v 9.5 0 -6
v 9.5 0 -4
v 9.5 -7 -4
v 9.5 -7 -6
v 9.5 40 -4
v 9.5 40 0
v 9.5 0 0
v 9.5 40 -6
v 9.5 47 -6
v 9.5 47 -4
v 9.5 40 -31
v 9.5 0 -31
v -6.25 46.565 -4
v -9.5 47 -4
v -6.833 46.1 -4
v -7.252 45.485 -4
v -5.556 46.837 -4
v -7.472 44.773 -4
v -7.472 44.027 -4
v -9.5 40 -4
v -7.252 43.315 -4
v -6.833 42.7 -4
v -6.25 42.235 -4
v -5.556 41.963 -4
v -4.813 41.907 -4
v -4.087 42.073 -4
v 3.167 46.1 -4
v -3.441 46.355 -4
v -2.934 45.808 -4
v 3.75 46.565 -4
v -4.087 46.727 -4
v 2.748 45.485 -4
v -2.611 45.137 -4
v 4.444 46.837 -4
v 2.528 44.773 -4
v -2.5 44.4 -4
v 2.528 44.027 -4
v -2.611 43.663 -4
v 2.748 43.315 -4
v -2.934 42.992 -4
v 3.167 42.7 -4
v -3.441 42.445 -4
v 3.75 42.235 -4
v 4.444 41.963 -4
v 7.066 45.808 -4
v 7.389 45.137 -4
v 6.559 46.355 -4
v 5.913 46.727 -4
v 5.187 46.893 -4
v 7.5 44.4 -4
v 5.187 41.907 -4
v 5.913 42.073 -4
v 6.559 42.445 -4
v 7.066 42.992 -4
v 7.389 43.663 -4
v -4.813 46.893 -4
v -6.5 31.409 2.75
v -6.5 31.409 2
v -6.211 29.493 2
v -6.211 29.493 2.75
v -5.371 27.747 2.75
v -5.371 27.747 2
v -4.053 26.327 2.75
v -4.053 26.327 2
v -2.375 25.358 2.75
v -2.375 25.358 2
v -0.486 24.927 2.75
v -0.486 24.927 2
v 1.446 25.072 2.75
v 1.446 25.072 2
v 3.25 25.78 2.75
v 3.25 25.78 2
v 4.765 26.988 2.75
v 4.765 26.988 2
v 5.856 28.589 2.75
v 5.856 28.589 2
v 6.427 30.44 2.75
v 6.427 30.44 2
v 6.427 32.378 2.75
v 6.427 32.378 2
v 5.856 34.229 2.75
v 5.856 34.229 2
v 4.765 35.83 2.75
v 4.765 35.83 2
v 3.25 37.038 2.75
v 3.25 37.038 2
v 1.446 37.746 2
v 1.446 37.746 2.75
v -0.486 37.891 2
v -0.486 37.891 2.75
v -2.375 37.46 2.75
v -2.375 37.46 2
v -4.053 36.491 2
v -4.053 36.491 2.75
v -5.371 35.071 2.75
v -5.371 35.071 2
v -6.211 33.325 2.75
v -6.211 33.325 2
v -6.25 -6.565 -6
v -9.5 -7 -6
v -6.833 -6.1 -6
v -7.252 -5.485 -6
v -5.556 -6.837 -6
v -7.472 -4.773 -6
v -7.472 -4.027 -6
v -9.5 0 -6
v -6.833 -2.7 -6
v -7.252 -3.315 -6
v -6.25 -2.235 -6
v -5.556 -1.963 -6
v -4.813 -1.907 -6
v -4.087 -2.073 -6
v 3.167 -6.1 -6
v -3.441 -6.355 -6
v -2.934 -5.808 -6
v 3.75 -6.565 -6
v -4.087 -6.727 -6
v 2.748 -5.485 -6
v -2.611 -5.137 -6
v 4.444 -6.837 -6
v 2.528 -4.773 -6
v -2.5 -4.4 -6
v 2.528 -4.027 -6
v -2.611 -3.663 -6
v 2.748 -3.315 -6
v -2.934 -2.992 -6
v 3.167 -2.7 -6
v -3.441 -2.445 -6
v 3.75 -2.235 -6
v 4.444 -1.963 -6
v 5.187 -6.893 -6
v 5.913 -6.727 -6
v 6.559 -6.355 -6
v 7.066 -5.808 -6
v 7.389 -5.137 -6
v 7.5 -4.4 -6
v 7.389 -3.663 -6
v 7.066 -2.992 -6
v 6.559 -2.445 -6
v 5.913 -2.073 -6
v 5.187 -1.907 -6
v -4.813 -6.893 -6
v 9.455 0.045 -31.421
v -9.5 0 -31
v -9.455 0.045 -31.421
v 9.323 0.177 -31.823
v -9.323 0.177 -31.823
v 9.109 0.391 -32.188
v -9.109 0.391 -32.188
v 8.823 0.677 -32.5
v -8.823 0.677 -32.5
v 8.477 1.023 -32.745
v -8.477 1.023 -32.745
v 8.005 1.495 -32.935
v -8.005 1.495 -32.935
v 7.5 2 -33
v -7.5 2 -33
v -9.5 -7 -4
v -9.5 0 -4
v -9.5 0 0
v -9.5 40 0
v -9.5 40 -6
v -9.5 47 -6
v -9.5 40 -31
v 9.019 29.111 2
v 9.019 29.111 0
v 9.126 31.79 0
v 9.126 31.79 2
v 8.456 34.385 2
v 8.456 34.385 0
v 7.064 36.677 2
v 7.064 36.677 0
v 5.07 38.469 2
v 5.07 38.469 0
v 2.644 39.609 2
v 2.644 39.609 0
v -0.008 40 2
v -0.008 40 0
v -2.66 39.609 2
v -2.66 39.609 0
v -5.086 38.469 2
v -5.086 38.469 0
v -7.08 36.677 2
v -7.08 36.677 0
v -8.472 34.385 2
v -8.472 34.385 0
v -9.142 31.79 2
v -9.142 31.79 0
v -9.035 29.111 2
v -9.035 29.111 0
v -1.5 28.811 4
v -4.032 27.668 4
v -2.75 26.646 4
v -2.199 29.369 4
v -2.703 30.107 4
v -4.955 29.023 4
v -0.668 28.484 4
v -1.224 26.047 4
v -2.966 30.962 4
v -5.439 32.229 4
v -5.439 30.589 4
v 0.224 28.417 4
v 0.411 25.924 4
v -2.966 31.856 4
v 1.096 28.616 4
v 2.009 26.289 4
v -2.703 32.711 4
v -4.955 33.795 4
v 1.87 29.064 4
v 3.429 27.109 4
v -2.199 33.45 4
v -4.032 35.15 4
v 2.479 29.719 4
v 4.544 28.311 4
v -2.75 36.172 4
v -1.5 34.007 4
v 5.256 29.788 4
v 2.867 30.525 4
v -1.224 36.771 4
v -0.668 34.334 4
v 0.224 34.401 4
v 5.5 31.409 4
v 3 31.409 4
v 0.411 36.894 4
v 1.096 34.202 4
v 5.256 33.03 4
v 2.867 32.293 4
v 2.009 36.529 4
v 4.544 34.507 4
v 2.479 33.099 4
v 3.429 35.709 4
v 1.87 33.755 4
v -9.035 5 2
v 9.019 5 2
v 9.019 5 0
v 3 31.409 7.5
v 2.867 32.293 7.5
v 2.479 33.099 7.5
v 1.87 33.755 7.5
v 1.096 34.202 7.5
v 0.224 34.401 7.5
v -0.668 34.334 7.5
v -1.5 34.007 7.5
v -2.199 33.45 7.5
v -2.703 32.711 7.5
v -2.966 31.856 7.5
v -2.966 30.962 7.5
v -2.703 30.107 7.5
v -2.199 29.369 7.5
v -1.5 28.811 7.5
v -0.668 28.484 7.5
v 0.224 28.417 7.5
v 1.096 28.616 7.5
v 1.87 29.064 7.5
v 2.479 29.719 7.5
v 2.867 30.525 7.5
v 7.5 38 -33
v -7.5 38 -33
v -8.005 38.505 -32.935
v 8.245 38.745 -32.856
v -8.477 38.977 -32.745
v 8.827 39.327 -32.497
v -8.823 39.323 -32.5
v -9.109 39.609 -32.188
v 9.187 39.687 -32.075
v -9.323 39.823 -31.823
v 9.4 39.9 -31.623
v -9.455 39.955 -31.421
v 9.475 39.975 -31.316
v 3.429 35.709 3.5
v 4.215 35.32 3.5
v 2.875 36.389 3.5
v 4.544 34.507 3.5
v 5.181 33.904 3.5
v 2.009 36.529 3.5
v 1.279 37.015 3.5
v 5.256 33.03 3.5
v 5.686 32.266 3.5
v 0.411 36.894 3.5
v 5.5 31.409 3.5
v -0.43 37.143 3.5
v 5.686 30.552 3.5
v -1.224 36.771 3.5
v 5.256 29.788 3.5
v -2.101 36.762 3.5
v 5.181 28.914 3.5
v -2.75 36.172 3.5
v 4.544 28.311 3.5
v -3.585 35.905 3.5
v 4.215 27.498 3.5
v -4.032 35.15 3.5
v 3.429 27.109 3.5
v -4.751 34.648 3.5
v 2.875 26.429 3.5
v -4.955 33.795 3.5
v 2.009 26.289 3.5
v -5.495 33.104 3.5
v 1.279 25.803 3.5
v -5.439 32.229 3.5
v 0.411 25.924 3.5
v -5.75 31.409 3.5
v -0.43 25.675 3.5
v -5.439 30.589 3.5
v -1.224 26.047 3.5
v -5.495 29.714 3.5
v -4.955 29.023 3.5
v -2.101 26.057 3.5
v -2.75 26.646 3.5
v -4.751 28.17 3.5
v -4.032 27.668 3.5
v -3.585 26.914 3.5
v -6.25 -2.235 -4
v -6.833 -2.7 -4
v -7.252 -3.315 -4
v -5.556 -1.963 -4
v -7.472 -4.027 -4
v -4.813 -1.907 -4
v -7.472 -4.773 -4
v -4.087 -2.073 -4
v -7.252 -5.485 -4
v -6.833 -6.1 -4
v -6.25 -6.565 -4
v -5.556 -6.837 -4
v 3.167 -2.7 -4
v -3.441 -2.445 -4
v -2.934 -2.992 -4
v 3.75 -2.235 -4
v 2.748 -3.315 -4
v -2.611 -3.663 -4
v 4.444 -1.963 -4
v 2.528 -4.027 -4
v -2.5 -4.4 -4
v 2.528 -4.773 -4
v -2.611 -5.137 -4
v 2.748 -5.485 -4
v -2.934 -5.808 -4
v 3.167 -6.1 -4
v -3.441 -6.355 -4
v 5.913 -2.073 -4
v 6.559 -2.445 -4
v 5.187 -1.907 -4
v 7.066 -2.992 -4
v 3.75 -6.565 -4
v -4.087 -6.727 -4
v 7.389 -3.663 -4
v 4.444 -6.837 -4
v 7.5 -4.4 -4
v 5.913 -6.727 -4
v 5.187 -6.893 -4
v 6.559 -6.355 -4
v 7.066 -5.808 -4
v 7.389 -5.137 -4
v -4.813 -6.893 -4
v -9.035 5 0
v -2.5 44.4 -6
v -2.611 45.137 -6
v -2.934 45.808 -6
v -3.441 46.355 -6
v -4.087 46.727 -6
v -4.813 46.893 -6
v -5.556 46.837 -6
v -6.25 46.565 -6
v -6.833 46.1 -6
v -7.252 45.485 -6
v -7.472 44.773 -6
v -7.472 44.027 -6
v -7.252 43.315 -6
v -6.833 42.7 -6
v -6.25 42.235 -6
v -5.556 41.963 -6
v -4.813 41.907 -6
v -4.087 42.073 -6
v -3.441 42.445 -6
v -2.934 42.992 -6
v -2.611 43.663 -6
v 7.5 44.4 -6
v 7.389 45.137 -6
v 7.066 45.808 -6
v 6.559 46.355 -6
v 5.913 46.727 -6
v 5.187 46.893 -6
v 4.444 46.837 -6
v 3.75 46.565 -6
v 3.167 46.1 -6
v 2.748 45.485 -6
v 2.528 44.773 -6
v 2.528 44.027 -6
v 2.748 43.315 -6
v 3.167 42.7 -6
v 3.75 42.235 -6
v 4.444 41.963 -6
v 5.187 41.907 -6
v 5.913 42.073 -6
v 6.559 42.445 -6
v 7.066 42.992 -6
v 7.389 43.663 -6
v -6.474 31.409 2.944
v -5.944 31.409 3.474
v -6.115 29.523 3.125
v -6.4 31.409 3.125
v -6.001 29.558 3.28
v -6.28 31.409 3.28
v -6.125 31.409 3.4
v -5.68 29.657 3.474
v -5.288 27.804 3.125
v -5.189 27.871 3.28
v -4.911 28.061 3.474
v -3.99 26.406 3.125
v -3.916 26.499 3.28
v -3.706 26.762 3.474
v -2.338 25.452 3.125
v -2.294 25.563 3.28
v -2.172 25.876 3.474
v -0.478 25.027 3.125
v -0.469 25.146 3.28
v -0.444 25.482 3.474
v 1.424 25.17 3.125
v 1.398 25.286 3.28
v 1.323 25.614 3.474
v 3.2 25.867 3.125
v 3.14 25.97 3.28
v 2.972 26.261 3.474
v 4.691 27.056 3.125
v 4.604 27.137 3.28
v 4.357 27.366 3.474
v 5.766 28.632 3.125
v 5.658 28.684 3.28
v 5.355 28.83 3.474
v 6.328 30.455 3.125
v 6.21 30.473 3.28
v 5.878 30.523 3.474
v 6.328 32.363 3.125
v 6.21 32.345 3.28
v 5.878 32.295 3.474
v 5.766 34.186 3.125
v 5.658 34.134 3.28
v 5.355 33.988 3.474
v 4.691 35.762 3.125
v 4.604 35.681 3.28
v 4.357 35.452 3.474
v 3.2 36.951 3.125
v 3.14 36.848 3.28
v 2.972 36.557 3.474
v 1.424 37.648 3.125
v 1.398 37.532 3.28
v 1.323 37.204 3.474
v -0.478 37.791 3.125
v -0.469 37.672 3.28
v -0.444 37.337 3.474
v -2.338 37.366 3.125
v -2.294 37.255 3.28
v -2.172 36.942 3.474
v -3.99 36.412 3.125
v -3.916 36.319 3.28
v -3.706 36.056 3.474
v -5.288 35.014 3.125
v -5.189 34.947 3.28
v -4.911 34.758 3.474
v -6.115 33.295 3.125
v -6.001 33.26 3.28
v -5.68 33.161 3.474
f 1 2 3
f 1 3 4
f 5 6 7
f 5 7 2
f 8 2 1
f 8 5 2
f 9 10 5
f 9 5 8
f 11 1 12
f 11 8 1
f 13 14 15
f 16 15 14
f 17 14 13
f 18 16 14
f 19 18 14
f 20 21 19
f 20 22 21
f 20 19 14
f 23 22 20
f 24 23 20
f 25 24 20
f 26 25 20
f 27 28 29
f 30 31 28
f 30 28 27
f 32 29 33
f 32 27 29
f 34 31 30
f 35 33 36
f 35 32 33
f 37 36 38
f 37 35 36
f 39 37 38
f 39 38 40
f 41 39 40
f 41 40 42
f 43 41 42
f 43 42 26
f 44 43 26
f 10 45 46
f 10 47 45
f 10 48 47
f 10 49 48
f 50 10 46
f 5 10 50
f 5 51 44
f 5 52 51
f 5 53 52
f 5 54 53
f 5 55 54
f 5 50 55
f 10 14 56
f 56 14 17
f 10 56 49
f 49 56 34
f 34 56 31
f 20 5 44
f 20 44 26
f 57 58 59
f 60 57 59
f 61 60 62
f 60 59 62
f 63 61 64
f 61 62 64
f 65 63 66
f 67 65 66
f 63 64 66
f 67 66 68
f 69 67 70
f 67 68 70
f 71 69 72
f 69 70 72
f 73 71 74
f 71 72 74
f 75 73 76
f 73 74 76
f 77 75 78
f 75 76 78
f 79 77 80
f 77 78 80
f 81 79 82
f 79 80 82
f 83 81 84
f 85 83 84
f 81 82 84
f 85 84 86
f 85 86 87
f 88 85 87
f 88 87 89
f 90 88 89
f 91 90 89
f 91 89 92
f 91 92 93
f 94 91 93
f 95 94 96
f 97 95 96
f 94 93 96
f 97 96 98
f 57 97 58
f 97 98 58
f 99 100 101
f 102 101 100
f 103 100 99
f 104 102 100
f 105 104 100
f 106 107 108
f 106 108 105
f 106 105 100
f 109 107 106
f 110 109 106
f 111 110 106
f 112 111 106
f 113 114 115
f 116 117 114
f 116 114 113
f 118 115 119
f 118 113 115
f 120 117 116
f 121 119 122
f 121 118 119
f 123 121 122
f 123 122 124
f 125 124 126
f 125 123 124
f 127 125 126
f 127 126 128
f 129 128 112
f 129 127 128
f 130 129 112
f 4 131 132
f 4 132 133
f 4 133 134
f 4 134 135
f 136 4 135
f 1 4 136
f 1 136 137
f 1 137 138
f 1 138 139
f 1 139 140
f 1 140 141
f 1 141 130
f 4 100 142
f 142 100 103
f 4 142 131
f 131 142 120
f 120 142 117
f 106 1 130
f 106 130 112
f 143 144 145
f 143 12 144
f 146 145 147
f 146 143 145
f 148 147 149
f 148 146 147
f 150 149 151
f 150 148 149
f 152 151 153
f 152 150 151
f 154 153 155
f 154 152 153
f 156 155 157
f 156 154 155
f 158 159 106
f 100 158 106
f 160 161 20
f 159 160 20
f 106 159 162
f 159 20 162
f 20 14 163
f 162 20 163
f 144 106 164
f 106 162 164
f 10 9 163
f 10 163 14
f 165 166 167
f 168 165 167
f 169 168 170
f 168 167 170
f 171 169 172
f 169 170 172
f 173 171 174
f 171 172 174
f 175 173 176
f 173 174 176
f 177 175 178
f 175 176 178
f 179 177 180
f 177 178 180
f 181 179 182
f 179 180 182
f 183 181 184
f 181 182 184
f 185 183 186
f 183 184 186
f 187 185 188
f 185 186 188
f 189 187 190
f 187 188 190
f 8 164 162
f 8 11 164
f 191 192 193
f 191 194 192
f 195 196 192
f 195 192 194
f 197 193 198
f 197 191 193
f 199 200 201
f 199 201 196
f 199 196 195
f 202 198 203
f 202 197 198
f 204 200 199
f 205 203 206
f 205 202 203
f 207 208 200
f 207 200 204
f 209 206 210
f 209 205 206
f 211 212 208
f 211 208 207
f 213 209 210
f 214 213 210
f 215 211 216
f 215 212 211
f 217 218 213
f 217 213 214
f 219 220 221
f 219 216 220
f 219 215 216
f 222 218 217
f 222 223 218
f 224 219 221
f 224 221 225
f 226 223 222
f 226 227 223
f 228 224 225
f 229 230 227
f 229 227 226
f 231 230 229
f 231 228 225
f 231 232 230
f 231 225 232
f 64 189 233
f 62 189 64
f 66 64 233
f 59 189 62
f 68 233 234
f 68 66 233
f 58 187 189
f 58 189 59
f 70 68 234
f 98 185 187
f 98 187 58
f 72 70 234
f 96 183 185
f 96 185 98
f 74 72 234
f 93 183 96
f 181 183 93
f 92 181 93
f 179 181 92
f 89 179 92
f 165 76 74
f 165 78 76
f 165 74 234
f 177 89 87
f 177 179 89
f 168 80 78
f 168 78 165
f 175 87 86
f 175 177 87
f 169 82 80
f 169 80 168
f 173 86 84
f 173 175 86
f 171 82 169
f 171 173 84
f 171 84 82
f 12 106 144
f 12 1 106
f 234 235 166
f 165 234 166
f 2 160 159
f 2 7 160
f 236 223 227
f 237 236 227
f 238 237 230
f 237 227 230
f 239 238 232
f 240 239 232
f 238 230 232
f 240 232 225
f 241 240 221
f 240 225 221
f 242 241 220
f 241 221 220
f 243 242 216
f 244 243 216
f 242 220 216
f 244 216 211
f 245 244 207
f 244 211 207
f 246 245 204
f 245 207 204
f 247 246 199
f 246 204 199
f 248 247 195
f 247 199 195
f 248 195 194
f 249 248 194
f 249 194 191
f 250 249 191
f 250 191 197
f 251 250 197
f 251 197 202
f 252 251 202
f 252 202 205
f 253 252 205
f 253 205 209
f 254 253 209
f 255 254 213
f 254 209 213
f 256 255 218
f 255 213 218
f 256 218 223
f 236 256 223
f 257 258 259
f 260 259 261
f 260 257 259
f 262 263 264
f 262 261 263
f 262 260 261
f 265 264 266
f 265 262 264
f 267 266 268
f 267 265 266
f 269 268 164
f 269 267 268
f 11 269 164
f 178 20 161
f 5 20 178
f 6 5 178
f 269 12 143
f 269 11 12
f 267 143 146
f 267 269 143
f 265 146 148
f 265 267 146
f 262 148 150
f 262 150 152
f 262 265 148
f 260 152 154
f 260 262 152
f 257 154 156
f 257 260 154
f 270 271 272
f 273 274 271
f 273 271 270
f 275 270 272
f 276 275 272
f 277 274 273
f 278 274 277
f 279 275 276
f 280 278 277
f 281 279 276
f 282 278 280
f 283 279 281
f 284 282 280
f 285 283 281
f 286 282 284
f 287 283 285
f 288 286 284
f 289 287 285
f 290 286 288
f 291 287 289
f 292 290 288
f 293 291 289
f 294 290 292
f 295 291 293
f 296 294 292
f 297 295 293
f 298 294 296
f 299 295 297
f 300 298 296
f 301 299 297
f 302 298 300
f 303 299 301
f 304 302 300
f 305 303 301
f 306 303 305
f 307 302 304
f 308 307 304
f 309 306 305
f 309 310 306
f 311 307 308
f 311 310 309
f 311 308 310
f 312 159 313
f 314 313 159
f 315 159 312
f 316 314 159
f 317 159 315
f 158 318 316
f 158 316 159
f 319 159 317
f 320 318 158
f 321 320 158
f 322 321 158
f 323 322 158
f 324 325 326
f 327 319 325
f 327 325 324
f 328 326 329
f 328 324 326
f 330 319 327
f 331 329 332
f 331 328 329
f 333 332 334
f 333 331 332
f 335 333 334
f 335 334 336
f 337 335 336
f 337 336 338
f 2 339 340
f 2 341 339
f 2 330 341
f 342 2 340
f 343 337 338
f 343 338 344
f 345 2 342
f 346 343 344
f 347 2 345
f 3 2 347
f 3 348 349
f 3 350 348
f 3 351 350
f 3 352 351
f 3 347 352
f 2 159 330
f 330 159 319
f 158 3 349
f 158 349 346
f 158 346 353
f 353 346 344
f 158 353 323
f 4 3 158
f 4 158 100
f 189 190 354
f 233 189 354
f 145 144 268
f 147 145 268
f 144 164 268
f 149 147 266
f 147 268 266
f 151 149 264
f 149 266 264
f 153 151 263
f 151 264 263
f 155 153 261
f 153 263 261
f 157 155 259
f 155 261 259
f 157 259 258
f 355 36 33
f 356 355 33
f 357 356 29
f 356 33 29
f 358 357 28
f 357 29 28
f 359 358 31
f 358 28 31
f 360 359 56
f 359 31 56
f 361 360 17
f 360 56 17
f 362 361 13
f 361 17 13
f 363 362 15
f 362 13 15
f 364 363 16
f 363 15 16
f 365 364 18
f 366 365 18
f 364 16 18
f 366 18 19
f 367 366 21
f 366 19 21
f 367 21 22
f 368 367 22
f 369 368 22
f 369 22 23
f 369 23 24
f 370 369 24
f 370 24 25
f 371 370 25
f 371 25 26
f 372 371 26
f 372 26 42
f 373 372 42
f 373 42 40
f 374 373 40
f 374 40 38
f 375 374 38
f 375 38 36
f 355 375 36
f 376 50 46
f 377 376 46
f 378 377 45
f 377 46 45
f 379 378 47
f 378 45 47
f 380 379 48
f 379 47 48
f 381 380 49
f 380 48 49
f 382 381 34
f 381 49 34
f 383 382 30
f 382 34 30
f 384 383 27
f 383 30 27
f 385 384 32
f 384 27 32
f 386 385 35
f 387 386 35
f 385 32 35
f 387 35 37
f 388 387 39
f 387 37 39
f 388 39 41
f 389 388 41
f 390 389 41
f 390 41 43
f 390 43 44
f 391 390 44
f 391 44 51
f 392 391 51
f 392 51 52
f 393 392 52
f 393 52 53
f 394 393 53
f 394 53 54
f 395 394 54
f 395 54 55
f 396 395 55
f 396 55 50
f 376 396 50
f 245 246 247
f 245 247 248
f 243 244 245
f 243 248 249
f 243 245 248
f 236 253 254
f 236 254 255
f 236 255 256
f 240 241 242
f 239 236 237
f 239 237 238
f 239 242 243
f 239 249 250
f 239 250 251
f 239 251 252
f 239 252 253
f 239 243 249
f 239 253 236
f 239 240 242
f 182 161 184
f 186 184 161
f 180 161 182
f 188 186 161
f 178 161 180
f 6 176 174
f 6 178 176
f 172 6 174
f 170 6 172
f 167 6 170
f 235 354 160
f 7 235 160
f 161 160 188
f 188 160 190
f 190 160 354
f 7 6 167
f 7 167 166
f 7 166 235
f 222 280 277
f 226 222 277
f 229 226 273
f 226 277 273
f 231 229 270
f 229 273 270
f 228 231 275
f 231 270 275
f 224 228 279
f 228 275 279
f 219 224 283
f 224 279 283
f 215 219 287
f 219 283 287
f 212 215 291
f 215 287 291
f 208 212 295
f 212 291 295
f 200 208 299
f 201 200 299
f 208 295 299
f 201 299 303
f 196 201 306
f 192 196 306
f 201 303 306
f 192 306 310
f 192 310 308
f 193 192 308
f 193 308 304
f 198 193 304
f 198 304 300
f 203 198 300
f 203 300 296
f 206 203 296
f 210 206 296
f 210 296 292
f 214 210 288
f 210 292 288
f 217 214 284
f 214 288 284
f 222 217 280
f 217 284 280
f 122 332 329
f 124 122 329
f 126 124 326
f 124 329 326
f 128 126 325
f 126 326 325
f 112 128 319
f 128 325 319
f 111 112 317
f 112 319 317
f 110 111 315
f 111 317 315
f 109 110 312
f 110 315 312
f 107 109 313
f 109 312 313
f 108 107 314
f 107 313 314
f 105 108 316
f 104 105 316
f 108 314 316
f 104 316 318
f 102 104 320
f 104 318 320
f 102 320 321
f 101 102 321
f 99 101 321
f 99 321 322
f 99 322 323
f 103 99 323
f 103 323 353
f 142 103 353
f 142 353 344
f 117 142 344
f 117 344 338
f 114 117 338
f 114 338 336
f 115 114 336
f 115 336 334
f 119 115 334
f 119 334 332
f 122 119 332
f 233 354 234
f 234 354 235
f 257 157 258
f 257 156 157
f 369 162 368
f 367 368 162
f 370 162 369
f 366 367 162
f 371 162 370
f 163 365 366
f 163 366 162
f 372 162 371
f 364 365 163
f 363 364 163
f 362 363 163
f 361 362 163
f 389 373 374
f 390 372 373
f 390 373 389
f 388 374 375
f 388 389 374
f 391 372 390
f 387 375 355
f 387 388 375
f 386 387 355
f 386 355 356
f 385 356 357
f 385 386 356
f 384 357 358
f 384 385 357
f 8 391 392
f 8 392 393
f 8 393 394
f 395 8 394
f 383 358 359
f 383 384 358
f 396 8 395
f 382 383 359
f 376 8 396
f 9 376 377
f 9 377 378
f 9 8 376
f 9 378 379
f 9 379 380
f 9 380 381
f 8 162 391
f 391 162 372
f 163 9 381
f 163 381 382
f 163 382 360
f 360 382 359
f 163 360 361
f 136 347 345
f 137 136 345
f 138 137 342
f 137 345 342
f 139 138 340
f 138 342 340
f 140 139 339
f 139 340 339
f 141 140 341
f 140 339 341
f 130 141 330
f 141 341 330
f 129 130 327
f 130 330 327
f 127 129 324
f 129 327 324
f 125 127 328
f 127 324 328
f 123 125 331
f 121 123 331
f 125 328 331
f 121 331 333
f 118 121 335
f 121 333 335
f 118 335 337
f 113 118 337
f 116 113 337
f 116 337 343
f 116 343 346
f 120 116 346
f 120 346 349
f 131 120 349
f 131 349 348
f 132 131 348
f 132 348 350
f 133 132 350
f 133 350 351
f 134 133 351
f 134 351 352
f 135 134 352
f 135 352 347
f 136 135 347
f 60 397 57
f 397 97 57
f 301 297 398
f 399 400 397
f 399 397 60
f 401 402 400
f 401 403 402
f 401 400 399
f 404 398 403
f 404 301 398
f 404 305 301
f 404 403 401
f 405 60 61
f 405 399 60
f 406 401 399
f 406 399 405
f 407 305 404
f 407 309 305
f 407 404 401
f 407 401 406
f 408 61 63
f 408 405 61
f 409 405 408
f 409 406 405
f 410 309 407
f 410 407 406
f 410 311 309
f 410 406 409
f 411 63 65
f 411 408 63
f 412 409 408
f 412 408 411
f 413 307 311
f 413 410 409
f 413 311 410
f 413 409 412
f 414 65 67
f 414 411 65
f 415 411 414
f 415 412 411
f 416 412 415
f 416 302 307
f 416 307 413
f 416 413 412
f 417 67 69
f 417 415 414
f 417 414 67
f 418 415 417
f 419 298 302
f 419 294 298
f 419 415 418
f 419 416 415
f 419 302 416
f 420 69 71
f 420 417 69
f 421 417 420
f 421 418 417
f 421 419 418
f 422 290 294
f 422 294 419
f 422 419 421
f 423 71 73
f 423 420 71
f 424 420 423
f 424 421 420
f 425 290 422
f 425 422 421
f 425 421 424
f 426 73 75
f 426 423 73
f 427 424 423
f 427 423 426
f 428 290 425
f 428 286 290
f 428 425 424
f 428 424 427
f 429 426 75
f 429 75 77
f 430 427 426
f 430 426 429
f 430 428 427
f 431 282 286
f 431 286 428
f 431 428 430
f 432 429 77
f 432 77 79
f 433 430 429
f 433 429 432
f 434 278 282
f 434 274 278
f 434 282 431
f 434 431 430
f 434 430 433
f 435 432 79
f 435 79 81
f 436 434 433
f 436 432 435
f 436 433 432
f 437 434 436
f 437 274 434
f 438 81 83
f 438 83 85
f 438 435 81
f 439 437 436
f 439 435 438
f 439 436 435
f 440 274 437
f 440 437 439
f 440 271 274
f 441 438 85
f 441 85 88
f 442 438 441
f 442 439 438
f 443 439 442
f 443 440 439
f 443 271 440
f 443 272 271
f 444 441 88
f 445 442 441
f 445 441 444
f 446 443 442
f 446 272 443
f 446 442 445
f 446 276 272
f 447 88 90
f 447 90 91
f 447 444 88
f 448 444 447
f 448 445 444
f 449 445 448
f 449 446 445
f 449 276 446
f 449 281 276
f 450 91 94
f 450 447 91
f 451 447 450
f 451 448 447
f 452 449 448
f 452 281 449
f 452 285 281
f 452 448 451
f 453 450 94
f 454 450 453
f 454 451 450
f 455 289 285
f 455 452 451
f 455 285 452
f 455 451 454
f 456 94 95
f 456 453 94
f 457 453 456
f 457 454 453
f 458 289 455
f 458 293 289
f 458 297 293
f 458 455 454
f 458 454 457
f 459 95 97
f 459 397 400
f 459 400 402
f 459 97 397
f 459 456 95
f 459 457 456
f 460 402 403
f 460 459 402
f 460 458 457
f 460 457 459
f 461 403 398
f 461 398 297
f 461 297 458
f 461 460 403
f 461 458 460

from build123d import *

# Parameters (mm, degrees)
BOSS_EXTRU_1_DEPTH       = 9.5
ESQUISSE3_R              = 2.5
ENL_V_MAT_EXTRU_40_DEPTH = 10
BOSS_EXTRU_2_DEPTH       = 2
CONG_1_R                 = 2
ESQUISSE5_R              = 6.5
BOSS_EXTRU_3_DEPTH       = 1.5
CONG_2_R                 = 0.75
ESQUISSE6_R              = 5.5
BOSS_EXTRU_4_DEPTH       = 0.5
ESQUISSE7_R              = 3
BOSS_EXTRU_5_DEPTH       = 3.5


with BuildPart() as part:
    # Esquisse1 → Boss.-Extru.1 (new, symmetric)
    with BuildSketch(Plane(origin=(0, 0, 0), x_dir=(0, 0, -1), z_dir=(1, 0, 0))):
        Polygon((0, 0), (4, 0), (4, -7), (6, -7), (6, 0), (33, 0), (33, 40), (6, 40), (6, 47), (4, 47), (4, 40), (0, 40), align=None)
    extrude(amount=BOSS_EXTRU_1_DEPTH, both=True)

    # Esquisse3 → Enlèv. mat.-Extru.40 (cut)
    with BuildSketch(Plane.XY.offset(-4)):
        with Locations((5, 44.4)):
            Circle(ESQUISSE3_R)
        with Locations((-5, 44.4)):
            Circle(ESQUISSE3_R)
        with Locations((5, -4.4)):
            Circle(ESQUISSE3_R)
        with Locations((-5, -4.4)):
            Circle(ESQUISSE3_R)
    extrude(amount=-ENL_V_MAT_EXTRU_40_DEPTH, mode=Mode.SUBTRACT)

    # Esquisse4 → Boss.-Extru.2 (add)
    with BuildSketch(Plane.XY):
        with BuildLine():
            Line((-9.034932354, 5), (9.018945802, 5))
            Line((9.018945802, 5), (9.018945802, 29.110938176))
            ThreePointArc((9.018945802, 29.110938176), (-0.007993276, 40), (-9.034932354, 29.110938176))
            Line((-9.034932354, 29.110938176), (-9.034932354, 5))
        make_face()
    extrude(amount=BOSS_EXTRU_2_DEPTH)

    # Congé1
    cong_1_edges = [part.edges().sort_by_distance(p)[0] for p in [
        (-9.5, 20, -33),
        (0, 40, -33),
        (0, 0, -33),
        (9.5, 20, -33),
    ]]
    fillet(cong_1_edges, radius=CONG_1_R)

    # Esquisse5 → Boss.-Extru.3 (add)
    with BuildSketch(Plane.XY.offset(2)):
        with Locations(Location((0, 31.4090745, 0), (0, 0, 180))):
            Circle(ESQUISSE5_R)
    extrude(amount=BOSS_EXTRU_3_DEPTH)

    # Congé2
    cong_2_edges = [part.edges().sort_by_distance(p)[0] for p in [
        (6.5, 31.4090745, 3.5),
    ]]
    fillet(cong_2_edges, radius=CONG_2_R)

    # Esquisse6 → Boss.-Extru.4 (add)
    with BuildSketch(Plane.XY.offset(3.5)):
        with Locations((0, 31.4090745)):
            Circle(ESQUISSE6_R)
    extrude(amount=BOSS_EXTRU_4_DEPTH)

    # Esquisse7 → Boss.-Extru.5 (add)
    with BuildSketch(Plane.XY.offset(4)):
        with Locations((0, 31.4090745)):
            Circle(ESQUISSE7_R)
    extrude(amount=BOSS_EXTRU_5_DEPTH)


solid = part.part
